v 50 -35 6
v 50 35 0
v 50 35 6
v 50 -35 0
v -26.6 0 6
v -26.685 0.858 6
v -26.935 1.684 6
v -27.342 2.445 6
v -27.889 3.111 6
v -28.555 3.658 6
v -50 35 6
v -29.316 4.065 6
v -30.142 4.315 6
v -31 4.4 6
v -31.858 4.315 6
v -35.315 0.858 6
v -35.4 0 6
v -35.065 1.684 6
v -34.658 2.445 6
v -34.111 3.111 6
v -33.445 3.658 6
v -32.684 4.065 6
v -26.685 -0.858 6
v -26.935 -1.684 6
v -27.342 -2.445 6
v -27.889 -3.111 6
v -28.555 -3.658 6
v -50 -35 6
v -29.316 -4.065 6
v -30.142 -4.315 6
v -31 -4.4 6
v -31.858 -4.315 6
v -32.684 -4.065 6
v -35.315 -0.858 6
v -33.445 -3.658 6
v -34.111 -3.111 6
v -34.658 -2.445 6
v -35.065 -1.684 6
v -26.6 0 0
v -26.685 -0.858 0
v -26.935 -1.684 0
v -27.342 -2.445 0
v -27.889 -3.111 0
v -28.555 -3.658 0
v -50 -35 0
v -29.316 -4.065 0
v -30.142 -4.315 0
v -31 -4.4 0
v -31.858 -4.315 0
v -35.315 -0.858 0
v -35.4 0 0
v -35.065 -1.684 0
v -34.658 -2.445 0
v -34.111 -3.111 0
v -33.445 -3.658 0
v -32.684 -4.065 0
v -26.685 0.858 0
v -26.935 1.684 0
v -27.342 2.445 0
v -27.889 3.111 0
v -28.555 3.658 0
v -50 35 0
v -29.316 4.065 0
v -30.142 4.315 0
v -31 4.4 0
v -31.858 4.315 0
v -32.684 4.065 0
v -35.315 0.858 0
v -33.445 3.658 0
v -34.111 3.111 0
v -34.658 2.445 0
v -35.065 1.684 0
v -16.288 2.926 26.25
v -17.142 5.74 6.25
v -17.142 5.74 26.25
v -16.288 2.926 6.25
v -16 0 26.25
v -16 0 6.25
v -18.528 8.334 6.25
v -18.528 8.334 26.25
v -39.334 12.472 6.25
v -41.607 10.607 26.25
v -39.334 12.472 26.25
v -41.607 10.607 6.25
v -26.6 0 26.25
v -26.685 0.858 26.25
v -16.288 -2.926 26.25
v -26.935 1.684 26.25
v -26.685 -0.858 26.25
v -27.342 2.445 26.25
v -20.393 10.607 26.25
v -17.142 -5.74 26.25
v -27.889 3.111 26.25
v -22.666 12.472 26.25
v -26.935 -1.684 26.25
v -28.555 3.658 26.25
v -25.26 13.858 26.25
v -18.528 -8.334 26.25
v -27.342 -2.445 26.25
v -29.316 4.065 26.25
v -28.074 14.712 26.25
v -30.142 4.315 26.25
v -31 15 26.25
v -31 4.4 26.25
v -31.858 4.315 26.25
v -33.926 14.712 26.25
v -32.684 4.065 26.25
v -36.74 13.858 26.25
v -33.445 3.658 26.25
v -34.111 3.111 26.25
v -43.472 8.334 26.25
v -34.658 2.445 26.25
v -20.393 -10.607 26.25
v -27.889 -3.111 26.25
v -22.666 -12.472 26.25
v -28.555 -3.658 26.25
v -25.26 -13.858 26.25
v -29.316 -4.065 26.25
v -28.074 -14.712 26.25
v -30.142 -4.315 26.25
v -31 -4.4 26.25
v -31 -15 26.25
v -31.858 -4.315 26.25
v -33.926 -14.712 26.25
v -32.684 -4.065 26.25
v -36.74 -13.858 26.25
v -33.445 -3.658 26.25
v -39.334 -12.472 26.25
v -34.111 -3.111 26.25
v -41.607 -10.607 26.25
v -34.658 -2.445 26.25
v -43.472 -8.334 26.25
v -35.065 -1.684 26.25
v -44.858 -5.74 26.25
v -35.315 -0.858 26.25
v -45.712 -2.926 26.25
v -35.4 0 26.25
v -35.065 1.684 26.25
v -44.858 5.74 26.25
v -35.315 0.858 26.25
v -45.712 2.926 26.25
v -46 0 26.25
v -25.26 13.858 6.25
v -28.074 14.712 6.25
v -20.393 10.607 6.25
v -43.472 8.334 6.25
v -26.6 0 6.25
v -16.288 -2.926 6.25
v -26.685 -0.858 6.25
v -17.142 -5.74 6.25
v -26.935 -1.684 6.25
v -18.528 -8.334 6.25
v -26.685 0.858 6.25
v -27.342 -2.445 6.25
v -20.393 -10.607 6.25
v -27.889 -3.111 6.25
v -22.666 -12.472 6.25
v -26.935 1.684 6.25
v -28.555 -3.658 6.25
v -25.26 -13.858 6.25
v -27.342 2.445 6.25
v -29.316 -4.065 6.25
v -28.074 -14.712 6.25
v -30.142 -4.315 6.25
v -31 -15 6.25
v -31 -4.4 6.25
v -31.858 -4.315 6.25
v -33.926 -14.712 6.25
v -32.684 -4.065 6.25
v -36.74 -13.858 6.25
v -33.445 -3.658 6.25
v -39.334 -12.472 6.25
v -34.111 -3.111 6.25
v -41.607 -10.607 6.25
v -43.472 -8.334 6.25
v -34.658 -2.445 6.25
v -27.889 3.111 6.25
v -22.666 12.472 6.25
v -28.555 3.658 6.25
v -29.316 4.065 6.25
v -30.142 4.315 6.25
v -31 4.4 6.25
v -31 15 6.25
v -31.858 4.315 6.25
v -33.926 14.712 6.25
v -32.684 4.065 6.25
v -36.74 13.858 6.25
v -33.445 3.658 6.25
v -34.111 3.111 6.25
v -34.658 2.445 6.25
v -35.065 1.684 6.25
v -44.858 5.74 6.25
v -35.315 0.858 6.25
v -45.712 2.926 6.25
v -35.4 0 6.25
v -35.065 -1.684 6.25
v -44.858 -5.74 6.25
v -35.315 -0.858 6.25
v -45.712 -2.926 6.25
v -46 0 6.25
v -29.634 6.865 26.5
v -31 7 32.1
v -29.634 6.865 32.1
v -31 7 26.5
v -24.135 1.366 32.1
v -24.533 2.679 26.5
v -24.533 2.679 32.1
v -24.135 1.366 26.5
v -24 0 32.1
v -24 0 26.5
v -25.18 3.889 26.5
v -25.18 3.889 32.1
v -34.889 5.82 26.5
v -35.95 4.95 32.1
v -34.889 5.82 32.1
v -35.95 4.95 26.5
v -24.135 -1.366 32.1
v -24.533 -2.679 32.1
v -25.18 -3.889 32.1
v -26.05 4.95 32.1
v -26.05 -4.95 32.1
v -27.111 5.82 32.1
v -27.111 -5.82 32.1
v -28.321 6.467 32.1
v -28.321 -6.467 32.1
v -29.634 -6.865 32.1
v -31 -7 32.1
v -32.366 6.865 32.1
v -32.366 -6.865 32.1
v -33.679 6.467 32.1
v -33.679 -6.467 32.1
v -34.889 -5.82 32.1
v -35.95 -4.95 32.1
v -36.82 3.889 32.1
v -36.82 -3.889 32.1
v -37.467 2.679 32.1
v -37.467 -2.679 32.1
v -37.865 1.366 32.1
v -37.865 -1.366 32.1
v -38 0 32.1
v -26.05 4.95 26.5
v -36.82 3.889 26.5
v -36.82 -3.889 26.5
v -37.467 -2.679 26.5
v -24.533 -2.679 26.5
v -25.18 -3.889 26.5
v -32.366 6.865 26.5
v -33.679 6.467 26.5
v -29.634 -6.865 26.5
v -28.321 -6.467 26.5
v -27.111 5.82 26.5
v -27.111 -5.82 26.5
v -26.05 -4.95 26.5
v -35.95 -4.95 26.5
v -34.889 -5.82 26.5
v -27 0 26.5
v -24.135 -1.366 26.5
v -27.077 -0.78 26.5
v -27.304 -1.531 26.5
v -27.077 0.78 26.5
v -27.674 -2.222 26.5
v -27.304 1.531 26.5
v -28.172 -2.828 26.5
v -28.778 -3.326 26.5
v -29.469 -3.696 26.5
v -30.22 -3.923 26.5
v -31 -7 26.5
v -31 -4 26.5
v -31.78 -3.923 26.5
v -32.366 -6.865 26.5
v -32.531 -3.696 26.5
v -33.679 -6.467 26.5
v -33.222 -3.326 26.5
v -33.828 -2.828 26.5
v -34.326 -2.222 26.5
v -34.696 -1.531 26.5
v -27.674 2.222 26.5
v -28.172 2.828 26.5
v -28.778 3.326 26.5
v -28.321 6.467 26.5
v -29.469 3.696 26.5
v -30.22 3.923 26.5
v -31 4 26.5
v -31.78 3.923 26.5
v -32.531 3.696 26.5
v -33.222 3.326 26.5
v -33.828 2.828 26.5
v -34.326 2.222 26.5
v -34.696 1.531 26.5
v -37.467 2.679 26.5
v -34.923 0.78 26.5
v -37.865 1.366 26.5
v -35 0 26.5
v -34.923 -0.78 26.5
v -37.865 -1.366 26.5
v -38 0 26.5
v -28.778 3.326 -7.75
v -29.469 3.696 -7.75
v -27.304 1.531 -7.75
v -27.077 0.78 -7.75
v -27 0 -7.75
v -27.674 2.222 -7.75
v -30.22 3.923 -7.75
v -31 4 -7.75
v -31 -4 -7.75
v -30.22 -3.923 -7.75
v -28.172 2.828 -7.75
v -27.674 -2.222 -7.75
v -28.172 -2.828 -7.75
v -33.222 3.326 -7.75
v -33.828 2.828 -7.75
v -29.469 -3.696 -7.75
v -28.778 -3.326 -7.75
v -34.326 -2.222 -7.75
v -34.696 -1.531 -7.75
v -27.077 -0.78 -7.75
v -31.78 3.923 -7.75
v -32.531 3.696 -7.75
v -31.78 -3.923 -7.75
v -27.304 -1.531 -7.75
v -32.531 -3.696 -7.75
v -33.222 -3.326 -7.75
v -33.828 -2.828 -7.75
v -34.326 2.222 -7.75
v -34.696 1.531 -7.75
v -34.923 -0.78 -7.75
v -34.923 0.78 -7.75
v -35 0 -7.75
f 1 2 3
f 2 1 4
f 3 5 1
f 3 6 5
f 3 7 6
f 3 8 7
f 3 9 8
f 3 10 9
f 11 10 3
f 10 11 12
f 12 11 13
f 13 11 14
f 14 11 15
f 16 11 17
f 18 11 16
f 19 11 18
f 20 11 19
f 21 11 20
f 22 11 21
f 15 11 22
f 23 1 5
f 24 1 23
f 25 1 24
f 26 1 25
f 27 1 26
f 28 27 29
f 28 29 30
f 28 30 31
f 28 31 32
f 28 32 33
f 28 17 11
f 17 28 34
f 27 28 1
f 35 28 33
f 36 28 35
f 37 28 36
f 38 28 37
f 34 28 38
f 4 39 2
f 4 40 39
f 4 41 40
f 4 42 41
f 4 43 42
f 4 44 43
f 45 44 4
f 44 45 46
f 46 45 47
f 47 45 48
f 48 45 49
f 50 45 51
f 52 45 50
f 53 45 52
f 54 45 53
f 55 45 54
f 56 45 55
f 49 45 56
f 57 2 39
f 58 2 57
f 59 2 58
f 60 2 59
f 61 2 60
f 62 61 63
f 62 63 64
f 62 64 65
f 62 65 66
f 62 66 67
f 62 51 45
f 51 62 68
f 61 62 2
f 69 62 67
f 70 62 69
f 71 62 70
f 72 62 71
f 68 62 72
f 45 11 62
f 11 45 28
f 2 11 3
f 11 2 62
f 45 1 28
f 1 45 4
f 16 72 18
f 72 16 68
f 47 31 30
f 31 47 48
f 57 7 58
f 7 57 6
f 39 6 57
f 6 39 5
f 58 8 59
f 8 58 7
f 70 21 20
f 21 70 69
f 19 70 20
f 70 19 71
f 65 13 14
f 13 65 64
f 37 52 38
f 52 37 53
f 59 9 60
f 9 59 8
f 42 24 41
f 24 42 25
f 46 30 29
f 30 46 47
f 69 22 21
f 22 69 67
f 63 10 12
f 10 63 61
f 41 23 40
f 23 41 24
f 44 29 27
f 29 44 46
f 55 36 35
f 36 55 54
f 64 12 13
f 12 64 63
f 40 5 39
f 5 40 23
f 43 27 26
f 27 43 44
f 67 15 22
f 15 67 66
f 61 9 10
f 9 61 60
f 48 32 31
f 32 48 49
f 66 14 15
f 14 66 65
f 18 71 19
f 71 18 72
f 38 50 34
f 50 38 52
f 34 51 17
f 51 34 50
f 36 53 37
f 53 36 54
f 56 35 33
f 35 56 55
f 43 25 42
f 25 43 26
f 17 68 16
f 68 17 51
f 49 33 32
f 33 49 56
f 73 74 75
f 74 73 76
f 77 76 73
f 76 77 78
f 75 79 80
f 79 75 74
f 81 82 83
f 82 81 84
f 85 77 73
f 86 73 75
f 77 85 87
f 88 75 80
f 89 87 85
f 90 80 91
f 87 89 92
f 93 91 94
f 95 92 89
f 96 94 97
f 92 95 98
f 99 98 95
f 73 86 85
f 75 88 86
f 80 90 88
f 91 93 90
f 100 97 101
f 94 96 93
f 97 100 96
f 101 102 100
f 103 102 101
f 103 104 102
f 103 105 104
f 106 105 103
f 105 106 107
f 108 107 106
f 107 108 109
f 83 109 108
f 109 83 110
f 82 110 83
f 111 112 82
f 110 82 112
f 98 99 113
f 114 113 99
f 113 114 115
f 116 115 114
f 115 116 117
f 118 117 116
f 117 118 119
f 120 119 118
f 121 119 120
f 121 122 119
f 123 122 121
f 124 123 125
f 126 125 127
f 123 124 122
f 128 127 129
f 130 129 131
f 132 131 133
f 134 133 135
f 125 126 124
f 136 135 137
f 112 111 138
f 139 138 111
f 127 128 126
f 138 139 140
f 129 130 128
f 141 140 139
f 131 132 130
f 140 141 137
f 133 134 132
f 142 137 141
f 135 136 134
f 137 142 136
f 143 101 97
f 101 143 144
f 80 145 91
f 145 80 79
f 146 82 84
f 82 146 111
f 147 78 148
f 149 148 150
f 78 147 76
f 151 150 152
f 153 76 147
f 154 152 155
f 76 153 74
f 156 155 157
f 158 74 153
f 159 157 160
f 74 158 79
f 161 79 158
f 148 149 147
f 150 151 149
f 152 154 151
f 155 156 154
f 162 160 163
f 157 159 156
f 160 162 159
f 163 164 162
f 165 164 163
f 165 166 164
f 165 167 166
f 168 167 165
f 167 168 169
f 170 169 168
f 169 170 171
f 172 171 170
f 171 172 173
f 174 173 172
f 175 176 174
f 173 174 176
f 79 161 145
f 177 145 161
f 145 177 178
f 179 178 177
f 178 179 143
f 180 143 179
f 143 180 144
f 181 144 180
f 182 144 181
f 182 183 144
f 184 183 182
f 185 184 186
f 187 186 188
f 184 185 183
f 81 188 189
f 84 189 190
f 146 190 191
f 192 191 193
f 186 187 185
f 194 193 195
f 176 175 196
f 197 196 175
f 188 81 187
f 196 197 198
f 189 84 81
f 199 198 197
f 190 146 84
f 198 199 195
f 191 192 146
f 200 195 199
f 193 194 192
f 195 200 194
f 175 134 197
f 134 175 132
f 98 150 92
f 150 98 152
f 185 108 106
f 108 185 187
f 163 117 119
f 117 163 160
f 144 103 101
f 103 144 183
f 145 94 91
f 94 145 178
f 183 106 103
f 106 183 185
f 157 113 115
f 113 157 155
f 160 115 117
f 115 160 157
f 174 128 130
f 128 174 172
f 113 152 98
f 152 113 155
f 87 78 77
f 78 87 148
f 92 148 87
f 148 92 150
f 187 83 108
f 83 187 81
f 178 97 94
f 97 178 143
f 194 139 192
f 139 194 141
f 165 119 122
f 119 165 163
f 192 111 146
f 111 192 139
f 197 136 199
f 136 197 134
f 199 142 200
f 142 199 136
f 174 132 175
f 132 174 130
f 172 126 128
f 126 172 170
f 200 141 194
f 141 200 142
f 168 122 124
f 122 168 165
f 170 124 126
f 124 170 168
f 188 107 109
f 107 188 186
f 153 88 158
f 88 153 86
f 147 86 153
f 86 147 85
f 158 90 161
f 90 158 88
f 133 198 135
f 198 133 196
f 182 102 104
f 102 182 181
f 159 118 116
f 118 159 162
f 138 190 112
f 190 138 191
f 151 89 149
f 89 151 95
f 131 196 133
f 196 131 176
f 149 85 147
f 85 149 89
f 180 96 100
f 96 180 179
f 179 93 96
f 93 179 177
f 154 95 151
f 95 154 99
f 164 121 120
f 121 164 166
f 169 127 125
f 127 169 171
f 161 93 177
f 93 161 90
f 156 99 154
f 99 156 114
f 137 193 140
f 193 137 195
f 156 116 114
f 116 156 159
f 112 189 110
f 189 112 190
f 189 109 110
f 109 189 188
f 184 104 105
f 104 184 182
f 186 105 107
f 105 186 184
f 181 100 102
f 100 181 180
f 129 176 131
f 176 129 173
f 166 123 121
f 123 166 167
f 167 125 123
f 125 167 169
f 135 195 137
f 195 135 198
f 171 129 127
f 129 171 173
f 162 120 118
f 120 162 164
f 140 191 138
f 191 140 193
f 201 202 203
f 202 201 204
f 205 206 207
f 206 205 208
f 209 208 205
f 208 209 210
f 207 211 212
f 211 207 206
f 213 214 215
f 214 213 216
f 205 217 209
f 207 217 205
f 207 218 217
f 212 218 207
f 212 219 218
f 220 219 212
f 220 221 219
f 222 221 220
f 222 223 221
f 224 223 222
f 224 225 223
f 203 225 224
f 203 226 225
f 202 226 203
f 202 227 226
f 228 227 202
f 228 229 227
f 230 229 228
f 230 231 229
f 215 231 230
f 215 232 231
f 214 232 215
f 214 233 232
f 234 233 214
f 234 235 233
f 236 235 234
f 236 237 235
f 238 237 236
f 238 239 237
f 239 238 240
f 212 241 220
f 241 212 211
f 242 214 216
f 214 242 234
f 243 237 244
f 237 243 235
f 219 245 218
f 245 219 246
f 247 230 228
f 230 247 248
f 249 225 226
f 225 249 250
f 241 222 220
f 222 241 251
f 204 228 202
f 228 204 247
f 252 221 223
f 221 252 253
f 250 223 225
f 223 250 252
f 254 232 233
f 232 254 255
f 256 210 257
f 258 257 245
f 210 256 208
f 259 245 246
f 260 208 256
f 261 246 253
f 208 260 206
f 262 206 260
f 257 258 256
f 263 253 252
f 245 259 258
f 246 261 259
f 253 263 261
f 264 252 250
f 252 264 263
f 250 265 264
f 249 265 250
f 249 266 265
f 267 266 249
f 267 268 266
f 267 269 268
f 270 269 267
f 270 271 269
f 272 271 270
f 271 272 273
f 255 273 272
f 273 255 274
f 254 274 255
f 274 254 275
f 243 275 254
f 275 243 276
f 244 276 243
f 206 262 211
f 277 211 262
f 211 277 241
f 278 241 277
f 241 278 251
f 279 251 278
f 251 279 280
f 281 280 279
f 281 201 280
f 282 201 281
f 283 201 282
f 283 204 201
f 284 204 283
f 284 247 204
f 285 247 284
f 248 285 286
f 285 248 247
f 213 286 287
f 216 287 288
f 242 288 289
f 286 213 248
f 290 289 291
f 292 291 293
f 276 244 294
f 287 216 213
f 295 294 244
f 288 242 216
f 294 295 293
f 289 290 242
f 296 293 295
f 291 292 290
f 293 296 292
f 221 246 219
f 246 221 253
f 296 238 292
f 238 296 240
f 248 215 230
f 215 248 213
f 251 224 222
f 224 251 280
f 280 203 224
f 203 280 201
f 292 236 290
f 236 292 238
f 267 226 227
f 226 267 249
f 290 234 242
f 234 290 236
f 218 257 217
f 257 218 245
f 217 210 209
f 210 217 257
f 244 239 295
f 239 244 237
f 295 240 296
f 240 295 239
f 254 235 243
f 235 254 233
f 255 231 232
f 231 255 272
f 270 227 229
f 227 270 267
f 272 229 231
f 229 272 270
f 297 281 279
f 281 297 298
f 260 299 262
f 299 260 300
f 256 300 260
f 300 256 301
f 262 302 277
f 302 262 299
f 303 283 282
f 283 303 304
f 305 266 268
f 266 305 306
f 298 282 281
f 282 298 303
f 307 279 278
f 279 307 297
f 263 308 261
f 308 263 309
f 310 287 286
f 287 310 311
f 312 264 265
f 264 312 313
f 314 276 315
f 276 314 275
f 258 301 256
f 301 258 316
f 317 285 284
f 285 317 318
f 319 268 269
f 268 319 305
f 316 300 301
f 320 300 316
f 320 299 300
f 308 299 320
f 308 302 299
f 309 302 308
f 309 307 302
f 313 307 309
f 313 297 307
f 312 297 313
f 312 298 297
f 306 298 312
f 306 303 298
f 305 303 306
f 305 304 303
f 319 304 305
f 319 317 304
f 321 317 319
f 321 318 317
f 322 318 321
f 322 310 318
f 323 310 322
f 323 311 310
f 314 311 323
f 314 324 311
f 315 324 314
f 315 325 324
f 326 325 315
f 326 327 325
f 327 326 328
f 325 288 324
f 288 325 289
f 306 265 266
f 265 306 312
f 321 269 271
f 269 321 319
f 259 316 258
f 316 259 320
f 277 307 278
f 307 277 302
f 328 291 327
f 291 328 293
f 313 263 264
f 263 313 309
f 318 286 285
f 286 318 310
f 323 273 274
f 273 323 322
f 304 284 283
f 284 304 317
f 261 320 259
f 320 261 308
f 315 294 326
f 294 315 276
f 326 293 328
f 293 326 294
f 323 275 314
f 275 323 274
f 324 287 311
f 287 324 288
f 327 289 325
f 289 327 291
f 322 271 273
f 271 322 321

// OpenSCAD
$fn = 32;

// ------------------------------------------------------------------------
// Standoff columns: 1 d30 standoffs, bolts d8
// Every part is its own module, assembly() places them once.
// ------------------------------------------------------------------------

// --- part 1 ---
module base_plate() {
  difference() {
    translate([-50, -35, 0]) cube([100, 70, 6]);
    translate([-31, 0, -1]) cylinder(h = 8, d = 8.8);
  }
}

// --- part 2 ---
module spacer() {
  difference() {
      translate([0, 0, 0]) cylinder(h = 20, d = 30);
      translate([0, 0, -1]) cylinder(h = 22, d = 8.8);
    }
}

// --- part 3 ---
module bolt() {
  cylinder(h = 5.6, d = 14);
  translate([0, 0, -34.25]) cylinder(h = 34.25, d = 8);
}

// --- assembly ---
module assembly() {
  translate([0, 0, 0]) rotate([0, 0, 0]) base_plate();
  translate([-31, 0, 6.25]) rotate([0, 0, 0]) spacer();
  translate([-31, 0, 26.5]) rotate([0, 0, 0]) bolt();
}

assembly();
